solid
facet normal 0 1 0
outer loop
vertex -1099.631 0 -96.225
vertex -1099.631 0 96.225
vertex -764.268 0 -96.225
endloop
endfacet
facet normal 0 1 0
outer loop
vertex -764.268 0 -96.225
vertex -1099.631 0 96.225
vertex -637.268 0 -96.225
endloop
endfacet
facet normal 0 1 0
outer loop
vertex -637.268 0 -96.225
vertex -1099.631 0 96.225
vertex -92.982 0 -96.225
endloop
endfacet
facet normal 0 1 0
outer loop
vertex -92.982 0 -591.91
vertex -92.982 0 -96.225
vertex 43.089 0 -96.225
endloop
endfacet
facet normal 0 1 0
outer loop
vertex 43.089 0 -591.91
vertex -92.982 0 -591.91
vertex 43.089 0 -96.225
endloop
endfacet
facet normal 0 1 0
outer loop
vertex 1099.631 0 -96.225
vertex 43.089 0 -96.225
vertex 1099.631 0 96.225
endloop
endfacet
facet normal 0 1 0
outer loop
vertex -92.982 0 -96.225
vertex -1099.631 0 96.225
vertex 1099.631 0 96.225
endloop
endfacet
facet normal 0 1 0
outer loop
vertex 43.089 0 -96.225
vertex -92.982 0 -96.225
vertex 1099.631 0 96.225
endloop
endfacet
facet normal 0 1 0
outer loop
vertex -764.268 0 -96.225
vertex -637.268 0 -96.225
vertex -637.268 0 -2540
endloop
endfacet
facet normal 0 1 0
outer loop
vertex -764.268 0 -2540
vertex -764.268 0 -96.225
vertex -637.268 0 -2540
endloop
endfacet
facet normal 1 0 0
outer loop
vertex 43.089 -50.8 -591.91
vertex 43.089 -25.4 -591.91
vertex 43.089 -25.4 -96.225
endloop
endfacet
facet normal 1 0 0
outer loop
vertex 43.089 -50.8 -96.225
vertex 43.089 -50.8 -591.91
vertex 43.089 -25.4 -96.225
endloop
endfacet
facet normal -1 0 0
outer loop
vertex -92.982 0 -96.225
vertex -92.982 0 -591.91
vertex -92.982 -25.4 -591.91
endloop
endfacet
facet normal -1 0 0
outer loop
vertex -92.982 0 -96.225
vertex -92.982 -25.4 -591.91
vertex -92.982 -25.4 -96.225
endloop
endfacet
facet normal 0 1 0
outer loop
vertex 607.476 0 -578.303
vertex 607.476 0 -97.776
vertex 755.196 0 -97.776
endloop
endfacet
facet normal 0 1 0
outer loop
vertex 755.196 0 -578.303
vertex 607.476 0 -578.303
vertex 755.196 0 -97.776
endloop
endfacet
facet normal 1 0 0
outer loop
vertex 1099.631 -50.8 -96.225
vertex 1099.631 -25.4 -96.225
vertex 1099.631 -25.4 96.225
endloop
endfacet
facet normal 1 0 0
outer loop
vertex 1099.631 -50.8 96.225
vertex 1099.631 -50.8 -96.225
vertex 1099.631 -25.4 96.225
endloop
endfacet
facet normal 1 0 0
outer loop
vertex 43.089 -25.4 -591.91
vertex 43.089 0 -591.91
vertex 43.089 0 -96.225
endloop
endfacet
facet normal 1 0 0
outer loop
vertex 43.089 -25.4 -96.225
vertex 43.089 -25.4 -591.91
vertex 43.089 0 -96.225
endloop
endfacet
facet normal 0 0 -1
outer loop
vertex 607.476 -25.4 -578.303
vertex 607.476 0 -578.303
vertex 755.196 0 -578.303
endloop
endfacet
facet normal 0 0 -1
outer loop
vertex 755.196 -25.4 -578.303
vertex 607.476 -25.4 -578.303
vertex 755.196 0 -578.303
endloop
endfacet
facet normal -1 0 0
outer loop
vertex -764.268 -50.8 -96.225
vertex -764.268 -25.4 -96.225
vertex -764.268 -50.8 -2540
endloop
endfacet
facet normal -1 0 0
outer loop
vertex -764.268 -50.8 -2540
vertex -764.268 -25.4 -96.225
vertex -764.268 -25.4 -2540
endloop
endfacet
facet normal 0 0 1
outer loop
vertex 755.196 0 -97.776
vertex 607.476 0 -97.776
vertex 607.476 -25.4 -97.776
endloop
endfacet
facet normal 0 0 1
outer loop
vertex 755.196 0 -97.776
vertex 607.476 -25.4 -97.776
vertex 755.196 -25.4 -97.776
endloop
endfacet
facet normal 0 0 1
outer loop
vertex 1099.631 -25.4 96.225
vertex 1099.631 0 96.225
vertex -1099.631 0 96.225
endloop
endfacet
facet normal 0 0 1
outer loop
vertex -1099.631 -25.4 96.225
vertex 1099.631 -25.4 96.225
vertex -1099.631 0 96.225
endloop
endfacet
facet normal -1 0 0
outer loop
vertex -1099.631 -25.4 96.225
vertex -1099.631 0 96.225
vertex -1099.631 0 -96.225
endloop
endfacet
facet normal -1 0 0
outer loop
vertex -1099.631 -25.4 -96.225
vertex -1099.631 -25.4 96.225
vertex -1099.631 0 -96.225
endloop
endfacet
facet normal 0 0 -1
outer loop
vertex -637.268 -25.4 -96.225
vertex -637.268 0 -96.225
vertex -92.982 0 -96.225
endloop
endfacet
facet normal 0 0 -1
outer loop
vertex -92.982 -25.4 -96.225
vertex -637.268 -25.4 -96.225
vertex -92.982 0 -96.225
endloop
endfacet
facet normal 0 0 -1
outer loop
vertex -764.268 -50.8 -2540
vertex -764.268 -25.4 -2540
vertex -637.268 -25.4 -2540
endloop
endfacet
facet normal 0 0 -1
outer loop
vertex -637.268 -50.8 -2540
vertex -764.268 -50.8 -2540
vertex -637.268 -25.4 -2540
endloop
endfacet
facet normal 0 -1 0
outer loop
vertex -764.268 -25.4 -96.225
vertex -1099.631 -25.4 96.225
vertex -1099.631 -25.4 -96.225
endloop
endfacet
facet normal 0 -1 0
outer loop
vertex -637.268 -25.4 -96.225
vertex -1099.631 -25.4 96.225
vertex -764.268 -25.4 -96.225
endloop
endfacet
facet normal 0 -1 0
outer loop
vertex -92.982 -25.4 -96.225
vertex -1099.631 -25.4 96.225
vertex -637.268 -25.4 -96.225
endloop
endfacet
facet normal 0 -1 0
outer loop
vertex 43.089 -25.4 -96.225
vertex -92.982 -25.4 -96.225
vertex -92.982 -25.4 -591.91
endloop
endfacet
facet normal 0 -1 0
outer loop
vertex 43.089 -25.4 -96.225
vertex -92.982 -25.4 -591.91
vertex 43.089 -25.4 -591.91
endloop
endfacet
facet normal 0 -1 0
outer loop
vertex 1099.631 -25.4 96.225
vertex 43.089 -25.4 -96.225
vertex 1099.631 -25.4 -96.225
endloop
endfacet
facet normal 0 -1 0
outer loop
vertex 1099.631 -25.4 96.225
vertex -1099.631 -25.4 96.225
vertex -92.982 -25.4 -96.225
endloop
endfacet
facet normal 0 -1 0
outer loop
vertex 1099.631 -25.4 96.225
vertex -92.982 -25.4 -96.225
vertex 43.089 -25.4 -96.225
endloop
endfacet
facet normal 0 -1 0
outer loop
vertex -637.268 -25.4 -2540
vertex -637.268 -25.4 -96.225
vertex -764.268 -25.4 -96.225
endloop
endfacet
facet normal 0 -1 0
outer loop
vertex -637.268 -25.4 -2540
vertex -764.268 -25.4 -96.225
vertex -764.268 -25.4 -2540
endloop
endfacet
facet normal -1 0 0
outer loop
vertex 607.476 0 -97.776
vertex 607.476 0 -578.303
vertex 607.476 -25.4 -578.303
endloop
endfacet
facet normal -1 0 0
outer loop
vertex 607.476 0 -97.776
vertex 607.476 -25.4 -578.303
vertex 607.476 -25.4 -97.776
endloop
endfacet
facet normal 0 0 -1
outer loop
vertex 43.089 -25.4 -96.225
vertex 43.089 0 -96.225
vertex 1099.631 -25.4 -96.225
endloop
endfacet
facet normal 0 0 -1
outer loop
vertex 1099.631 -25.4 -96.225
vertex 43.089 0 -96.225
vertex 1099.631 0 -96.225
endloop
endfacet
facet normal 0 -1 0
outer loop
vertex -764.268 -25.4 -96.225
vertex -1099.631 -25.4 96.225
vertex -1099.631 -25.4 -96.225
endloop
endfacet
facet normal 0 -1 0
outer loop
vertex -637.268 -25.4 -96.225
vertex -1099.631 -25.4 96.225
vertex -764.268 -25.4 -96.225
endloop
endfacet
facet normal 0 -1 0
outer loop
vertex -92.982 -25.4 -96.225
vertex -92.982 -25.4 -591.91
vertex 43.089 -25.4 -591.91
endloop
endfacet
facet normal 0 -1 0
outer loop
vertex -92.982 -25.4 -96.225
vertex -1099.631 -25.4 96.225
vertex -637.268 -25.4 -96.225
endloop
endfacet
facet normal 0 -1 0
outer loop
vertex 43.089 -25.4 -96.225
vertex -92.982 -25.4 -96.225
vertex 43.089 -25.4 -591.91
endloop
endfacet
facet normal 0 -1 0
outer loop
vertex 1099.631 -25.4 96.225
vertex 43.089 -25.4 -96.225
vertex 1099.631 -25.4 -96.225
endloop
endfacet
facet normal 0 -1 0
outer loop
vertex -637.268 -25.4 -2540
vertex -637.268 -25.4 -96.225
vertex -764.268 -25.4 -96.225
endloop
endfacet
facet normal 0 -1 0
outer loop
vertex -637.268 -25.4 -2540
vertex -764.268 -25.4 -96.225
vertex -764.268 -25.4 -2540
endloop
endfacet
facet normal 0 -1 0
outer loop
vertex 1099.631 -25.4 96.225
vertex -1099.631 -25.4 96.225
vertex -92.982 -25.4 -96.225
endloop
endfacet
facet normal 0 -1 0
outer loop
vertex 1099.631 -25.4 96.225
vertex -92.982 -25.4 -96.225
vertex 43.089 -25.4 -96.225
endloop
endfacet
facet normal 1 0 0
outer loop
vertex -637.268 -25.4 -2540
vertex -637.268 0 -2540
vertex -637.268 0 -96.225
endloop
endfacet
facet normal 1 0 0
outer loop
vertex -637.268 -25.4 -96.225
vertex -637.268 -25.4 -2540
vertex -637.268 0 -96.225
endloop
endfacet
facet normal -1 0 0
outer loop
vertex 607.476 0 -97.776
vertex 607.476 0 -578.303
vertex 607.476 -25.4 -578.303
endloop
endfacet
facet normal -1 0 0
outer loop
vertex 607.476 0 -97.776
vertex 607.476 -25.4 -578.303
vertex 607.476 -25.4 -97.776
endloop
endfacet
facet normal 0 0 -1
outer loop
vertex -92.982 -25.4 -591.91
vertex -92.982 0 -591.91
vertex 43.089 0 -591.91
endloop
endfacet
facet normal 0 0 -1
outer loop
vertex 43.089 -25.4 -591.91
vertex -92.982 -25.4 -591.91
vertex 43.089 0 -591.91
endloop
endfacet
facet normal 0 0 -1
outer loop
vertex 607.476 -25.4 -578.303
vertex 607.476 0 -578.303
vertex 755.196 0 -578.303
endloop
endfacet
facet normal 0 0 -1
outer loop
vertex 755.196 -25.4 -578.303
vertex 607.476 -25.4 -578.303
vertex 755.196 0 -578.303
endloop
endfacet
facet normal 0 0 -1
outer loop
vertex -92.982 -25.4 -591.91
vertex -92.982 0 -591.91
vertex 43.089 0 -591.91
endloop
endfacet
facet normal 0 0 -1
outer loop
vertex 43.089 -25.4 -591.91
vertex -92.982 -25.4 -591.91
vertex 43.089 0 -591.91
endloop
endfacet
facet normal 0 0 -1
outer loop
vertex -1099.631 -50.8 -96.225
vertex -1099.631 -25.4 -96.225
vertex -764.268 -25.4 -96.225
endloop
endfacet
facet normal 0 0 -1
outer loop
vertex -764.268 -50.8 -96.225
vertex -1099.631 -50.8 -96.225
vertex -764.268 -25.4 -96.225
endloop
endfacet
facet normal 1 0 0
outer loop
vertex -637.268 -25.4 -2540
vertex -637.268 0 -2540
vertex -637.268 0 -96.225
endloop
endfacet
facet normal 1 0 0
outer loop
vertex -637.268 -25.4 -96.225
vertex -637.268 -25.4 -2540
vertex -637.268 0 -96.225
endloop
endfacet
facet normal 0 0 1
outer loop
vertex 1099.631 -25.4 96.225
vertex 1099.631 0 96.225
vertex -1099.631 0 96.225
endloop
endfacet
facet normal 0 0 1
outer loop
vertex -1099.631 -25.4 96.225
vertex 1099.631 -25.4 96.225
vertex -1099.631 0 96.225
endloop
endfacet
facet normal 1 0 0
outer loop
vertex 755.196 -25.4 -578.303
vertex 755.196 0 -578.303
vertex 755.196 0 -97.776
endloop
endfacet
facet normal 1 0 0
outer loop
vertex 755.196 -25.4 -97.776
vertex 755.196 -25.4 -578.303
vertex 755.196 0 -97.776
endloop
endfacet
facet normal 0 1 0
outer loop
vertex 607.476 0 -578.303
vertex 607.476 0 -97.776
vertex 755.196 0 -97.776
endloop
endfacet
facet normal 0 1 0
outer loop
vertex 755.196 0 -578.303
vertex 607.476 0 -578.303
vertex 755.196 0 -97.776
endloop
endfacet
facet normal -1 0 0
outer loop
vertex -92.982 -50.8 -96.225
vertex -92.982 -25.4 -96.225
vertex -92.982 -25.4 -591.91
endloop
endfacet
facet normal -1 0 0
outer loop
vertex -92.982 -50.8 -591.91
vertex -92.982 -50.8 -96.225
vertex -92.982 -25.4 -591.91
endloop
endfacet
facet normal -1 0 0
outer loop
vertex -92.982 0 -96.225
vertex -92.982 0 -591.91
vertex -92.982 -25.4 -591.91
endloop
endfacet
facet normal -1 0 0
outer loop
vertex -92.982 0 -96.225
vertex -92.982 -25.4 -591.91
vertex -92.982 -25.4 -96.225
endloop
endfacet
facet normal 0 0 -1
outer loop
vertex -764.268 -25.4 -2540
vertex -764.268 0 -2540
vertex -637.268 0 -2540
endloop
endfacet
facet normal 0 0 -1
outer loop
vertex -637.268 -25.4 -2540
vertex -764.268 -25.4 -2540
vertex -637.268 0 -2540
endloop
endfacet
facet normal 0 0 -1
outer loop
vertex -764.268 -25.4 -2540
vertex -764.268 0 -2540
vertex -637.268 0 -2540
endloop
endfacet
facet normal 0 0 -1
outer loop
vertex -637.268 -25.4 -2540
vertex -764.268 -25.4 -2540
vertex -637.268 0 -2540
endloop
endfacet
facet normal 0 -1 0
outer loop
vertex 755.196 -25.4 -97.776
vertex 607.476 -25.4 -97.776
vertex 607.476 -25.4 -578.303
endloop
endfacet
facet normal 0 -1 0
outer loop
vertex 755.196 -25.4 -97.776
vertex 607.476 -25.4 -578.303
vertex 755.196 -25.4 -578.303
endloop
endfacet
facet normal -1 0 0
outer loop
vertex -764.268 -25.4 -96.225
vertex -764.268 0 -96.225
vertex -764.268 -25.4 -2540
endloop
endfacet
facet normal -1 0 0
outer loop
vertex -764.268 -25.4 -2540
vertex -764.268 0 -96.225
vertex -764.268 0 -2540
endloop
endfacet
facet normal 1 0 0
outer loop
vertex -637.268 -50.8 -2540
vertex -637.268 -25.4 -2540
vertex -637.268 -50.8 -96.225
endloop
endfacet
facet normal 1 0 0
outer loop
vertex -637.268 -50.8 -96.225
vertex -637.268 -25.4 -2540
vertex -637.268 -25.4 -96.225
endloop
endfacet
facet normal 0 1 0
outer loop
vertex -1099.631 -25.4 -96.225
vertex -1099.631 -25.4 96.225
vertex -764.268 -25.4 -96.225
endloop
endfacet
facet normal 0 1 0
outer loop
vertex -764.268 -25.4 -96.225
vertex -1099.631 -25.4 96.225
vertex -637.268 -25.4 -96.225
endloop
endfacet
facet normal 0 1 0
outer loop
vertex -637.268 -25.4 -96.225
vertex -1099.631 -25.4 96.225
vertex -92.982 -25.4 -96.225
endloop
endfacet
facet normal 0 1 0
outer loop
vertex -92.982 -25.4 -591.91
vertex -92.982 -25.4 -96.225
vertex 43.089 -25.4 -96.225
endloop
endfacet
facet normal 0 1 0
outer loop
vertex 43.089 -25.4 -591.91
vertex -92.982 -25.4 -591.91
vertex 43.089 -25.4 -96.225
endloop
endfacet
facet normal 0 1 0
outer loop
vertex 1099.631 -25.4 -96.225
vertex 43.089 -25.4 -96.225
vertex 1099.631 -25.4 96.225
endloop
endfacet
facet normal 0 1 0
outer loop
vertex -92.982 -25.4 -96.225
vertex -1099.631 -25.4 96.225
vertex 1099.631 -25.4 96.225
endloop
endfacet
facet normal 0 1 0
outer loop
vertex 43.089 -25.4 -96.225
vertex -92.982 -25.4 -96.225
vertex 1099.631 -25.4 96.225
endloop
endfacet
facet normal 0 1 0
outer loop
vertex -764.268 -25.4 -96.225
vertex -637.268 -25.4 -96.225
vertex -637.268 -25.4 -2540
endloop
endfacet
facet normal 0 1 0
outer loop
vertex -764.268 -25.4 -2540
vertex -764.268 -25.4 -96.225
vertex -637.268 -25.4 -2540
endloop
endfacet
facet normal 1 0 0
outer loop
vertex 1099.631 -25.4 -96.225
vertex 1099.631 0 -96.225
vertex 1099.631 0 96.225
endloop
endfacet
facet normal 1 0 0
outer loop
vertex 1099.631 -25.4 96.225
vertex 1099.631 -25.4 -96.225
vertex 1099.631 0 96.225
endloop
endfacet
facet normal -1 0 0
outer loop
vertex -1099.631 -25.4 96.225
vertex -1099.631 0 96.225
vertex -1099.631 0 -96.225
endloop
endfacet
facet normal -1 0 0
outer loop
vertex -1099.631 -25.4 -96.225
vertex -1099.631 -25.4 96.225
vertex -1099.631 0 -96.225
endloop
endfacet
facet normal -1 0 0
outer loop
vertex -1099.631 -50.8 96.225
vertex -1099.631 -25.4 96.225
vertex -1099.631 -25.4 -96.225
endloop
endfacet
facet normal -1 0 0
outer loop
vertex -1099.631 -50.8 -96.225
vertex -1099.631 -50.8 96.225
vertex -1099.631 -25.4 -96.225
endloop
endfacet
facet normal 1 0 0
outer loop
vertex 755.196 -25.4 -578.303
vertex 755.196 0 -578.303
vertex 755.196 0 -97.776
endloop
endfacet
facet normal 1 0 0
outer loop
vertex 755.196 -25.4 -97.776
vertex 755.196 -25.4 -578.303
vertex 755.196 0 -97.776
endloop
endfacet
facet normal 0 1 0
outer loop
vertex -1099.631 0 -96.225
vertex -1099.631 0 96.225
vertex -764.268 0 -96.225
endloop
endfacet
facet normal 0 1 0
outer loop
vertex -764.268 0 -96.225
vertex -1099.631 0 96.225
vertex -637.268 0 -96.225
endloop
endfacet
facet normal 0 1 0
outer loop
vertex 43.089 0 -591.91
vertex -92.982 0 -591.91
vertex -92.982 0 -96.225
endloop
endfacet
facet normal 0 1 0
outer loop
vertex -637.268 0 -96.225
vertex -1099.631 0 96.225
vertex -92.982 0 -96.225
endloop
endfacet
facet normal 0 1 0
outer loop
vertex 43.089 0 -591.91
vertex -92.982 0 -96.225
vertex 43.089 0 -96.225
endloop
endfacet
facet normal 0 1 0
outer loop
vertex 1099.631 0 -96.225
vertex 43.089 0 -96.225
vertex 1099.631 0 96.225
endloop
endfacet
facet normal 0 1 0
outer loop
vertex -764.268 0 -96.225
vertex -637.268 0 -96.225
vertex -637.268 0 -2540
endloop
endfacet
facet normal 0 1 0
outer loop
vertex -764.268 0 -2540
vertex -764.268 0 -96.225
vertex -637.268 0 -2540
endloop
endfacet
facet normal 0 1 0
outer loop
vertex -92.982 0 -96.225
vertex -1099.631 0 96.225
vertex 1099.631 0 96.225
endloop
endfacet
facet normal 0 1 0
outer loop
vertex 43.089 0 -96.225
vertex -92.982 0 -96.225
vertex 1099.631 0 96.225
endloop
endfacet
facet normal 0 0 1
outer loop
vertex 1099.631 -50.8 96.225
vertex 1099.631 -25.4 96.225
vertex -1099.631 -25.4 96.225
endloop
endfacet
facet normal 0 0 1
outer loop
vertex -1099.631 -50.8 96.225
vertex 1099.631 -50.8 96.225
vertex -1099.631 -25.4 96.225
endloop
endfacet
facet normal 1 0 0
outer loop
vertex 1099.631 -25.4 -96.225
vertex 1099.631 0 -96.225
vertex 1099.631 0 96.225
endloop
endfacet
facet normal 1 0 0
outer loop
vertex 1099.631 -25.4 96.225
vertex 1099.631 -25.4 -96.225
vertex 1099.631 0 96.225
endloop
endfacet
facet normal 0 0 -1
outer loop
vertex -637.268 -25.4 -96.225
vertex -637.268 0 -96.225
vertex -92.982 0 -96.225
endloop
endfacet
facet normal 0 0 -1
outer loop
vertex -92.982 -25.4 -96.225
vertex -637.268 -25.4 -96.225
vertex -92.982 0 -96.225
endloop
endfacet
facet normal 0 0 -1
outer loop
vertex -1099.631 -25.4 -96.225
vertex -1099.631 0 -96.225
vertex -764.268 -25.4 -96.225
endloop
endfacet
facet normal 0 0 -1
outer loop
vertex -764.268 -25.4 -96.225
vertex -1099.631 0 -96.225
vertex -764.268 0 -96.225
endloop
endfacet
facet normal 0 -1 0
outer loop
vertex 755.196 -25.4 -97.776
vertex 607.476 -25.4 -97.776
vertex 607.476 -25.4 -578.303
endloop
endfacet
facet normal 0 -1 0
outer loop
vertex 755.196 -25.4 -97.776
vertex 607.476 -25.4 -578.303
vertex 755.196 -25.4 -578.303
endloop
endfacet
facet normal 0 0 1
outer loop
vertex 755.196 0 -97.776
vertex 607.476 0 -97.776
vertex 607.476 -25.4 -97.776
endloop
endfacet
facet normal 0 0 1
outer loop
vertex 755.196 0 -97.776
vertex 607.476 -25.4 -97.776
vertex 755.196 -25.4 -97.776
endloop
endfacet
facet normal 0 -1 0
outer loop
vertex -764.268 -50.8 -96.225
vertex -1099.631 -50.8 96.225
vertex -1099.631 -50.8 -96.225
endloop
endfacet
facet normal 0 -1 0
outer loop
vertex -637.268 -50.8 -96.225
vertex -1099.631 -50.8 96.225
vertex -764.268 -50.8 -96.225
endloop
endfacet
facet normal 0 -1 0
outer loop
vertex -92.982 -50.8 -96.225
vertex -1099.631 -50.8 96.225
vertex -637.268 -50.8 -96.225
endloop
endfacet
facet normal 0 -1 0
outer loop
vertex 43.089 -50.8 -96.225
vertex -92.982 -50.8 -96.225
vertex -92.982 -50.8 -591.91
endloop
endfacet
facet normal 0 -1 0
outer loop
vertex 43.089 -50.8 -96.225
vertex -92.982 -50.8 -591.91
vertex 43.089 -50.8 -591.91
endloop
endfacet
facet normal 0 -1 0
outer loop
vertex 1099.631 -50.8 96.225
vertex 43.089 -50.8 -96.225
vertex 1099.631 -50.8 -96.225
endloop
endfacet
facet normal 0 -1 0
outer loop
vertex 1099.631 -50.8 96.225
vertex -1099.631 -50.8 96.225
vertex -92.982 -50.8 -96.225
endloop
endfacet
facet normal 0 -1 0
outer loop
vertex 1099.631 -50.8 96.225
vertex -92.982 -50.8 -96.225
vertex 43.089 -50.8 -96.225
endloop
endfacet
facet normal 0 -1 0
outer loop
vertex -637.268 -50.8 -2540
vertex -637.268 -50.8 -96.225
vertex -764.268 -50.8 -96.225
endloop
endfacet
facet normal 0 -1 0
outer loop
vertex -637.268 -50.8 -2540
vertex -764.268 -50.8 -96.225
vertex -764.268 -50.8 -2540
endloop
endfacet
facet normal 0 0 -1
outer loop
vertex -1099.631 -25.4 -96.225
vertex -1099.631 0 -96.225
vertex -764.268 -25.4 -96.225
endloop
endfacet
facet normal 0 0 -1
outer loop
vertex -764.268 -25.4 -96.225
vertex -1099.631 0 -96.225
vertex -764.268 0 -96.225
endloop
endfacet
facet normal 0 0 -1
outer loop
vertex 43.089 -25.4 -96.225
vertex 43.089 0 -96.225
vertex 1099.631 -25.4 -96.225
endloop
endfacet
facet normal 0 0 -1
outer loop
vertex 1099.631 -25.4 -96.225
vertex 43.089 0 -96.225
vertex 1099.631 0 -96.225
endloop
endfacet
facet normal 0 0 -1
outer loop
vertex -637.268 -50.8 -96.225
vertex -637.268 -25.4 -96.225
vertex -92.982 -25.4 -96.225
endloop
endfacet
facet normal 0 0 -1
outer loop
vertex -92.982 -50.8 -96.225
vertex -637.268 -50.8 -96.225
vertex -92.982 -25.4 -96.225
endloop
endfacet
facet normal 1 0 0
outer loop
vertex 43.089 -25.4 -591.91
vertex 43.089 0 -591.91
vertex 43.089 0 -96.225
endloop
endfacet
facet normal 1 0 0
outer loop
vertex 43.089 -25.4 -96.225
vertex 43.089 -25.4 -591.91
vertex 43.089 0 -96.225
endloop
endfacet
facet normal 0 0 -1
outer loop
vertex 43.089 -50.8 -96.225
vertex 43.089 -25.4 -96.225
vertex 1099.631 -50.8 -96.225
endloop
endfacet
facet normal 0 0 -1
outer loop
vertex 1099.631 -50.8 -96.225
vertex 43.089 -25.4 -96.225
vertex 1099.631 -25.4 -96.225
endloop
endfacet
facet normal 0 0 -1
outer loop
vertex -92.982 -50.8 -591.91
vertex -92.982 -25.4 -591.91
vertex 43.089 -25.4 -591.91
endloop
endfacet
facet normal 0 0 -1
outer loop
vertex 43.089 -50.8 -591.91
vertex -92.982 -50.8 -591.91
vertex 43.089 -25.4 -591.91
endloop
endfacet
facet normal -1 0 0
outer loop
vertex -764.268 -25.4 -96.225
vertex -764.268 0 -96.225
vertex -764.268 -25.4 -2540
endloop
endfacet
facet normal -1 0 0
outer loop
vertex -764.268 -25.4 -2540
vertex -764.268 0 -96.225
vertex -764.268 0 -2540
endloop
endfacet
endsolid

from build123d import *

# Parameters (mm, degrees)
F0_W     = 127
F0_H     = 1935.77512
F0_H_2   = 507.999781
F0_W_2   = 136.071353
F0_H_3   = 495.685312
F0_W_3   = 147.719816
F0_H_4   = 480.527499
F1_DEPTH = 25.4
F2_DEPTH = 25.4
F3_DEPTH = 25.4


with BuildPart() as f1:
    # F0 (on Front) → F1 (new body)
    with BuildSketch(Plane.XZ):
        with Locations((-700.767518, -1064.112659)):
            Rectangle(F0_W, F0_H)
        with Locations((-700.767518, -2286.000109)):
            Rectangle(F0_W, F0_H_2)
        with Locations((-24.946454, -344.067755)):
            Rectangle(F0_W_2, F0_H_3)
        with Locations((681.33607, -338.039555)):
            Rectangle(F0_W_3, F0_H_4)
        Polygon((1099.630639, 96.225099), (-1099.630639, 96.225099), (-1099.630639, -96.225099), (-764.267518, -96.225099), (-637.267518, -96.225099), (-92.982131, -96.225099), (43.089222, -96.225099), (1099.630639, -96.225099), align=None)
    extrude(amount=F1_DEPTH)


with BuildPart() as f2:
    # F0 (on Front) → F2 (new body)
    with BuildSketch(Plane.XZ):
        with Locations((681.33607, -338.039555)):
            Rectangle(F0_W_3, F0_H_4)
        Polygon((1099.630639, 96.225099), (-1099.630639, 96.225099), (-1099.630639, -96.225099), (-764.267518, -96.225099), (-637.267518, -96.225099), (-92.982131, -96.225099), (43.089222, -96.225099), (1099.630639, -96.225099), align=None)
        with Locations((-700.767518, -1064.112659)):
            Rectangle(F0_W, F0_H)
        with Locations((-24.946454, -344.067755)):
            Rectangle(F0_W_2, F0_H_3)
        with Locations((-700.767518, -2286.000109)):
            Rectangle(F0_W, F0_H_2)
    extrude(amount=F2_DEPTH)


with BuildPart() as f3:
    # F1_face (on face) → F3 (new body)
    with BuildSketch(Plane(origin=(-273.604254, -25.4, -539.656877), x_dir=(1, 0, 0), z_dir=(0, -1, 0))):
        Polygon((1373.234893, 635.881976), (-826.026385, 635.881976), (-826.026385, 443.431778), (-490.663265, 443.431778), (-490.663265, -2000.343123), (-363.663265, -2000.343123), (-363.663265, 443.431778), (180.622123, 443.431778), (180.622123, -52.253534), (316.693476, -52.253534), (316.693476, 443.431778), (1373.234893, 443.431778), align=None)
    extrude(amount=F3_DEPTH)


solid = Compound([f1.part, f2.part, f3.part])
